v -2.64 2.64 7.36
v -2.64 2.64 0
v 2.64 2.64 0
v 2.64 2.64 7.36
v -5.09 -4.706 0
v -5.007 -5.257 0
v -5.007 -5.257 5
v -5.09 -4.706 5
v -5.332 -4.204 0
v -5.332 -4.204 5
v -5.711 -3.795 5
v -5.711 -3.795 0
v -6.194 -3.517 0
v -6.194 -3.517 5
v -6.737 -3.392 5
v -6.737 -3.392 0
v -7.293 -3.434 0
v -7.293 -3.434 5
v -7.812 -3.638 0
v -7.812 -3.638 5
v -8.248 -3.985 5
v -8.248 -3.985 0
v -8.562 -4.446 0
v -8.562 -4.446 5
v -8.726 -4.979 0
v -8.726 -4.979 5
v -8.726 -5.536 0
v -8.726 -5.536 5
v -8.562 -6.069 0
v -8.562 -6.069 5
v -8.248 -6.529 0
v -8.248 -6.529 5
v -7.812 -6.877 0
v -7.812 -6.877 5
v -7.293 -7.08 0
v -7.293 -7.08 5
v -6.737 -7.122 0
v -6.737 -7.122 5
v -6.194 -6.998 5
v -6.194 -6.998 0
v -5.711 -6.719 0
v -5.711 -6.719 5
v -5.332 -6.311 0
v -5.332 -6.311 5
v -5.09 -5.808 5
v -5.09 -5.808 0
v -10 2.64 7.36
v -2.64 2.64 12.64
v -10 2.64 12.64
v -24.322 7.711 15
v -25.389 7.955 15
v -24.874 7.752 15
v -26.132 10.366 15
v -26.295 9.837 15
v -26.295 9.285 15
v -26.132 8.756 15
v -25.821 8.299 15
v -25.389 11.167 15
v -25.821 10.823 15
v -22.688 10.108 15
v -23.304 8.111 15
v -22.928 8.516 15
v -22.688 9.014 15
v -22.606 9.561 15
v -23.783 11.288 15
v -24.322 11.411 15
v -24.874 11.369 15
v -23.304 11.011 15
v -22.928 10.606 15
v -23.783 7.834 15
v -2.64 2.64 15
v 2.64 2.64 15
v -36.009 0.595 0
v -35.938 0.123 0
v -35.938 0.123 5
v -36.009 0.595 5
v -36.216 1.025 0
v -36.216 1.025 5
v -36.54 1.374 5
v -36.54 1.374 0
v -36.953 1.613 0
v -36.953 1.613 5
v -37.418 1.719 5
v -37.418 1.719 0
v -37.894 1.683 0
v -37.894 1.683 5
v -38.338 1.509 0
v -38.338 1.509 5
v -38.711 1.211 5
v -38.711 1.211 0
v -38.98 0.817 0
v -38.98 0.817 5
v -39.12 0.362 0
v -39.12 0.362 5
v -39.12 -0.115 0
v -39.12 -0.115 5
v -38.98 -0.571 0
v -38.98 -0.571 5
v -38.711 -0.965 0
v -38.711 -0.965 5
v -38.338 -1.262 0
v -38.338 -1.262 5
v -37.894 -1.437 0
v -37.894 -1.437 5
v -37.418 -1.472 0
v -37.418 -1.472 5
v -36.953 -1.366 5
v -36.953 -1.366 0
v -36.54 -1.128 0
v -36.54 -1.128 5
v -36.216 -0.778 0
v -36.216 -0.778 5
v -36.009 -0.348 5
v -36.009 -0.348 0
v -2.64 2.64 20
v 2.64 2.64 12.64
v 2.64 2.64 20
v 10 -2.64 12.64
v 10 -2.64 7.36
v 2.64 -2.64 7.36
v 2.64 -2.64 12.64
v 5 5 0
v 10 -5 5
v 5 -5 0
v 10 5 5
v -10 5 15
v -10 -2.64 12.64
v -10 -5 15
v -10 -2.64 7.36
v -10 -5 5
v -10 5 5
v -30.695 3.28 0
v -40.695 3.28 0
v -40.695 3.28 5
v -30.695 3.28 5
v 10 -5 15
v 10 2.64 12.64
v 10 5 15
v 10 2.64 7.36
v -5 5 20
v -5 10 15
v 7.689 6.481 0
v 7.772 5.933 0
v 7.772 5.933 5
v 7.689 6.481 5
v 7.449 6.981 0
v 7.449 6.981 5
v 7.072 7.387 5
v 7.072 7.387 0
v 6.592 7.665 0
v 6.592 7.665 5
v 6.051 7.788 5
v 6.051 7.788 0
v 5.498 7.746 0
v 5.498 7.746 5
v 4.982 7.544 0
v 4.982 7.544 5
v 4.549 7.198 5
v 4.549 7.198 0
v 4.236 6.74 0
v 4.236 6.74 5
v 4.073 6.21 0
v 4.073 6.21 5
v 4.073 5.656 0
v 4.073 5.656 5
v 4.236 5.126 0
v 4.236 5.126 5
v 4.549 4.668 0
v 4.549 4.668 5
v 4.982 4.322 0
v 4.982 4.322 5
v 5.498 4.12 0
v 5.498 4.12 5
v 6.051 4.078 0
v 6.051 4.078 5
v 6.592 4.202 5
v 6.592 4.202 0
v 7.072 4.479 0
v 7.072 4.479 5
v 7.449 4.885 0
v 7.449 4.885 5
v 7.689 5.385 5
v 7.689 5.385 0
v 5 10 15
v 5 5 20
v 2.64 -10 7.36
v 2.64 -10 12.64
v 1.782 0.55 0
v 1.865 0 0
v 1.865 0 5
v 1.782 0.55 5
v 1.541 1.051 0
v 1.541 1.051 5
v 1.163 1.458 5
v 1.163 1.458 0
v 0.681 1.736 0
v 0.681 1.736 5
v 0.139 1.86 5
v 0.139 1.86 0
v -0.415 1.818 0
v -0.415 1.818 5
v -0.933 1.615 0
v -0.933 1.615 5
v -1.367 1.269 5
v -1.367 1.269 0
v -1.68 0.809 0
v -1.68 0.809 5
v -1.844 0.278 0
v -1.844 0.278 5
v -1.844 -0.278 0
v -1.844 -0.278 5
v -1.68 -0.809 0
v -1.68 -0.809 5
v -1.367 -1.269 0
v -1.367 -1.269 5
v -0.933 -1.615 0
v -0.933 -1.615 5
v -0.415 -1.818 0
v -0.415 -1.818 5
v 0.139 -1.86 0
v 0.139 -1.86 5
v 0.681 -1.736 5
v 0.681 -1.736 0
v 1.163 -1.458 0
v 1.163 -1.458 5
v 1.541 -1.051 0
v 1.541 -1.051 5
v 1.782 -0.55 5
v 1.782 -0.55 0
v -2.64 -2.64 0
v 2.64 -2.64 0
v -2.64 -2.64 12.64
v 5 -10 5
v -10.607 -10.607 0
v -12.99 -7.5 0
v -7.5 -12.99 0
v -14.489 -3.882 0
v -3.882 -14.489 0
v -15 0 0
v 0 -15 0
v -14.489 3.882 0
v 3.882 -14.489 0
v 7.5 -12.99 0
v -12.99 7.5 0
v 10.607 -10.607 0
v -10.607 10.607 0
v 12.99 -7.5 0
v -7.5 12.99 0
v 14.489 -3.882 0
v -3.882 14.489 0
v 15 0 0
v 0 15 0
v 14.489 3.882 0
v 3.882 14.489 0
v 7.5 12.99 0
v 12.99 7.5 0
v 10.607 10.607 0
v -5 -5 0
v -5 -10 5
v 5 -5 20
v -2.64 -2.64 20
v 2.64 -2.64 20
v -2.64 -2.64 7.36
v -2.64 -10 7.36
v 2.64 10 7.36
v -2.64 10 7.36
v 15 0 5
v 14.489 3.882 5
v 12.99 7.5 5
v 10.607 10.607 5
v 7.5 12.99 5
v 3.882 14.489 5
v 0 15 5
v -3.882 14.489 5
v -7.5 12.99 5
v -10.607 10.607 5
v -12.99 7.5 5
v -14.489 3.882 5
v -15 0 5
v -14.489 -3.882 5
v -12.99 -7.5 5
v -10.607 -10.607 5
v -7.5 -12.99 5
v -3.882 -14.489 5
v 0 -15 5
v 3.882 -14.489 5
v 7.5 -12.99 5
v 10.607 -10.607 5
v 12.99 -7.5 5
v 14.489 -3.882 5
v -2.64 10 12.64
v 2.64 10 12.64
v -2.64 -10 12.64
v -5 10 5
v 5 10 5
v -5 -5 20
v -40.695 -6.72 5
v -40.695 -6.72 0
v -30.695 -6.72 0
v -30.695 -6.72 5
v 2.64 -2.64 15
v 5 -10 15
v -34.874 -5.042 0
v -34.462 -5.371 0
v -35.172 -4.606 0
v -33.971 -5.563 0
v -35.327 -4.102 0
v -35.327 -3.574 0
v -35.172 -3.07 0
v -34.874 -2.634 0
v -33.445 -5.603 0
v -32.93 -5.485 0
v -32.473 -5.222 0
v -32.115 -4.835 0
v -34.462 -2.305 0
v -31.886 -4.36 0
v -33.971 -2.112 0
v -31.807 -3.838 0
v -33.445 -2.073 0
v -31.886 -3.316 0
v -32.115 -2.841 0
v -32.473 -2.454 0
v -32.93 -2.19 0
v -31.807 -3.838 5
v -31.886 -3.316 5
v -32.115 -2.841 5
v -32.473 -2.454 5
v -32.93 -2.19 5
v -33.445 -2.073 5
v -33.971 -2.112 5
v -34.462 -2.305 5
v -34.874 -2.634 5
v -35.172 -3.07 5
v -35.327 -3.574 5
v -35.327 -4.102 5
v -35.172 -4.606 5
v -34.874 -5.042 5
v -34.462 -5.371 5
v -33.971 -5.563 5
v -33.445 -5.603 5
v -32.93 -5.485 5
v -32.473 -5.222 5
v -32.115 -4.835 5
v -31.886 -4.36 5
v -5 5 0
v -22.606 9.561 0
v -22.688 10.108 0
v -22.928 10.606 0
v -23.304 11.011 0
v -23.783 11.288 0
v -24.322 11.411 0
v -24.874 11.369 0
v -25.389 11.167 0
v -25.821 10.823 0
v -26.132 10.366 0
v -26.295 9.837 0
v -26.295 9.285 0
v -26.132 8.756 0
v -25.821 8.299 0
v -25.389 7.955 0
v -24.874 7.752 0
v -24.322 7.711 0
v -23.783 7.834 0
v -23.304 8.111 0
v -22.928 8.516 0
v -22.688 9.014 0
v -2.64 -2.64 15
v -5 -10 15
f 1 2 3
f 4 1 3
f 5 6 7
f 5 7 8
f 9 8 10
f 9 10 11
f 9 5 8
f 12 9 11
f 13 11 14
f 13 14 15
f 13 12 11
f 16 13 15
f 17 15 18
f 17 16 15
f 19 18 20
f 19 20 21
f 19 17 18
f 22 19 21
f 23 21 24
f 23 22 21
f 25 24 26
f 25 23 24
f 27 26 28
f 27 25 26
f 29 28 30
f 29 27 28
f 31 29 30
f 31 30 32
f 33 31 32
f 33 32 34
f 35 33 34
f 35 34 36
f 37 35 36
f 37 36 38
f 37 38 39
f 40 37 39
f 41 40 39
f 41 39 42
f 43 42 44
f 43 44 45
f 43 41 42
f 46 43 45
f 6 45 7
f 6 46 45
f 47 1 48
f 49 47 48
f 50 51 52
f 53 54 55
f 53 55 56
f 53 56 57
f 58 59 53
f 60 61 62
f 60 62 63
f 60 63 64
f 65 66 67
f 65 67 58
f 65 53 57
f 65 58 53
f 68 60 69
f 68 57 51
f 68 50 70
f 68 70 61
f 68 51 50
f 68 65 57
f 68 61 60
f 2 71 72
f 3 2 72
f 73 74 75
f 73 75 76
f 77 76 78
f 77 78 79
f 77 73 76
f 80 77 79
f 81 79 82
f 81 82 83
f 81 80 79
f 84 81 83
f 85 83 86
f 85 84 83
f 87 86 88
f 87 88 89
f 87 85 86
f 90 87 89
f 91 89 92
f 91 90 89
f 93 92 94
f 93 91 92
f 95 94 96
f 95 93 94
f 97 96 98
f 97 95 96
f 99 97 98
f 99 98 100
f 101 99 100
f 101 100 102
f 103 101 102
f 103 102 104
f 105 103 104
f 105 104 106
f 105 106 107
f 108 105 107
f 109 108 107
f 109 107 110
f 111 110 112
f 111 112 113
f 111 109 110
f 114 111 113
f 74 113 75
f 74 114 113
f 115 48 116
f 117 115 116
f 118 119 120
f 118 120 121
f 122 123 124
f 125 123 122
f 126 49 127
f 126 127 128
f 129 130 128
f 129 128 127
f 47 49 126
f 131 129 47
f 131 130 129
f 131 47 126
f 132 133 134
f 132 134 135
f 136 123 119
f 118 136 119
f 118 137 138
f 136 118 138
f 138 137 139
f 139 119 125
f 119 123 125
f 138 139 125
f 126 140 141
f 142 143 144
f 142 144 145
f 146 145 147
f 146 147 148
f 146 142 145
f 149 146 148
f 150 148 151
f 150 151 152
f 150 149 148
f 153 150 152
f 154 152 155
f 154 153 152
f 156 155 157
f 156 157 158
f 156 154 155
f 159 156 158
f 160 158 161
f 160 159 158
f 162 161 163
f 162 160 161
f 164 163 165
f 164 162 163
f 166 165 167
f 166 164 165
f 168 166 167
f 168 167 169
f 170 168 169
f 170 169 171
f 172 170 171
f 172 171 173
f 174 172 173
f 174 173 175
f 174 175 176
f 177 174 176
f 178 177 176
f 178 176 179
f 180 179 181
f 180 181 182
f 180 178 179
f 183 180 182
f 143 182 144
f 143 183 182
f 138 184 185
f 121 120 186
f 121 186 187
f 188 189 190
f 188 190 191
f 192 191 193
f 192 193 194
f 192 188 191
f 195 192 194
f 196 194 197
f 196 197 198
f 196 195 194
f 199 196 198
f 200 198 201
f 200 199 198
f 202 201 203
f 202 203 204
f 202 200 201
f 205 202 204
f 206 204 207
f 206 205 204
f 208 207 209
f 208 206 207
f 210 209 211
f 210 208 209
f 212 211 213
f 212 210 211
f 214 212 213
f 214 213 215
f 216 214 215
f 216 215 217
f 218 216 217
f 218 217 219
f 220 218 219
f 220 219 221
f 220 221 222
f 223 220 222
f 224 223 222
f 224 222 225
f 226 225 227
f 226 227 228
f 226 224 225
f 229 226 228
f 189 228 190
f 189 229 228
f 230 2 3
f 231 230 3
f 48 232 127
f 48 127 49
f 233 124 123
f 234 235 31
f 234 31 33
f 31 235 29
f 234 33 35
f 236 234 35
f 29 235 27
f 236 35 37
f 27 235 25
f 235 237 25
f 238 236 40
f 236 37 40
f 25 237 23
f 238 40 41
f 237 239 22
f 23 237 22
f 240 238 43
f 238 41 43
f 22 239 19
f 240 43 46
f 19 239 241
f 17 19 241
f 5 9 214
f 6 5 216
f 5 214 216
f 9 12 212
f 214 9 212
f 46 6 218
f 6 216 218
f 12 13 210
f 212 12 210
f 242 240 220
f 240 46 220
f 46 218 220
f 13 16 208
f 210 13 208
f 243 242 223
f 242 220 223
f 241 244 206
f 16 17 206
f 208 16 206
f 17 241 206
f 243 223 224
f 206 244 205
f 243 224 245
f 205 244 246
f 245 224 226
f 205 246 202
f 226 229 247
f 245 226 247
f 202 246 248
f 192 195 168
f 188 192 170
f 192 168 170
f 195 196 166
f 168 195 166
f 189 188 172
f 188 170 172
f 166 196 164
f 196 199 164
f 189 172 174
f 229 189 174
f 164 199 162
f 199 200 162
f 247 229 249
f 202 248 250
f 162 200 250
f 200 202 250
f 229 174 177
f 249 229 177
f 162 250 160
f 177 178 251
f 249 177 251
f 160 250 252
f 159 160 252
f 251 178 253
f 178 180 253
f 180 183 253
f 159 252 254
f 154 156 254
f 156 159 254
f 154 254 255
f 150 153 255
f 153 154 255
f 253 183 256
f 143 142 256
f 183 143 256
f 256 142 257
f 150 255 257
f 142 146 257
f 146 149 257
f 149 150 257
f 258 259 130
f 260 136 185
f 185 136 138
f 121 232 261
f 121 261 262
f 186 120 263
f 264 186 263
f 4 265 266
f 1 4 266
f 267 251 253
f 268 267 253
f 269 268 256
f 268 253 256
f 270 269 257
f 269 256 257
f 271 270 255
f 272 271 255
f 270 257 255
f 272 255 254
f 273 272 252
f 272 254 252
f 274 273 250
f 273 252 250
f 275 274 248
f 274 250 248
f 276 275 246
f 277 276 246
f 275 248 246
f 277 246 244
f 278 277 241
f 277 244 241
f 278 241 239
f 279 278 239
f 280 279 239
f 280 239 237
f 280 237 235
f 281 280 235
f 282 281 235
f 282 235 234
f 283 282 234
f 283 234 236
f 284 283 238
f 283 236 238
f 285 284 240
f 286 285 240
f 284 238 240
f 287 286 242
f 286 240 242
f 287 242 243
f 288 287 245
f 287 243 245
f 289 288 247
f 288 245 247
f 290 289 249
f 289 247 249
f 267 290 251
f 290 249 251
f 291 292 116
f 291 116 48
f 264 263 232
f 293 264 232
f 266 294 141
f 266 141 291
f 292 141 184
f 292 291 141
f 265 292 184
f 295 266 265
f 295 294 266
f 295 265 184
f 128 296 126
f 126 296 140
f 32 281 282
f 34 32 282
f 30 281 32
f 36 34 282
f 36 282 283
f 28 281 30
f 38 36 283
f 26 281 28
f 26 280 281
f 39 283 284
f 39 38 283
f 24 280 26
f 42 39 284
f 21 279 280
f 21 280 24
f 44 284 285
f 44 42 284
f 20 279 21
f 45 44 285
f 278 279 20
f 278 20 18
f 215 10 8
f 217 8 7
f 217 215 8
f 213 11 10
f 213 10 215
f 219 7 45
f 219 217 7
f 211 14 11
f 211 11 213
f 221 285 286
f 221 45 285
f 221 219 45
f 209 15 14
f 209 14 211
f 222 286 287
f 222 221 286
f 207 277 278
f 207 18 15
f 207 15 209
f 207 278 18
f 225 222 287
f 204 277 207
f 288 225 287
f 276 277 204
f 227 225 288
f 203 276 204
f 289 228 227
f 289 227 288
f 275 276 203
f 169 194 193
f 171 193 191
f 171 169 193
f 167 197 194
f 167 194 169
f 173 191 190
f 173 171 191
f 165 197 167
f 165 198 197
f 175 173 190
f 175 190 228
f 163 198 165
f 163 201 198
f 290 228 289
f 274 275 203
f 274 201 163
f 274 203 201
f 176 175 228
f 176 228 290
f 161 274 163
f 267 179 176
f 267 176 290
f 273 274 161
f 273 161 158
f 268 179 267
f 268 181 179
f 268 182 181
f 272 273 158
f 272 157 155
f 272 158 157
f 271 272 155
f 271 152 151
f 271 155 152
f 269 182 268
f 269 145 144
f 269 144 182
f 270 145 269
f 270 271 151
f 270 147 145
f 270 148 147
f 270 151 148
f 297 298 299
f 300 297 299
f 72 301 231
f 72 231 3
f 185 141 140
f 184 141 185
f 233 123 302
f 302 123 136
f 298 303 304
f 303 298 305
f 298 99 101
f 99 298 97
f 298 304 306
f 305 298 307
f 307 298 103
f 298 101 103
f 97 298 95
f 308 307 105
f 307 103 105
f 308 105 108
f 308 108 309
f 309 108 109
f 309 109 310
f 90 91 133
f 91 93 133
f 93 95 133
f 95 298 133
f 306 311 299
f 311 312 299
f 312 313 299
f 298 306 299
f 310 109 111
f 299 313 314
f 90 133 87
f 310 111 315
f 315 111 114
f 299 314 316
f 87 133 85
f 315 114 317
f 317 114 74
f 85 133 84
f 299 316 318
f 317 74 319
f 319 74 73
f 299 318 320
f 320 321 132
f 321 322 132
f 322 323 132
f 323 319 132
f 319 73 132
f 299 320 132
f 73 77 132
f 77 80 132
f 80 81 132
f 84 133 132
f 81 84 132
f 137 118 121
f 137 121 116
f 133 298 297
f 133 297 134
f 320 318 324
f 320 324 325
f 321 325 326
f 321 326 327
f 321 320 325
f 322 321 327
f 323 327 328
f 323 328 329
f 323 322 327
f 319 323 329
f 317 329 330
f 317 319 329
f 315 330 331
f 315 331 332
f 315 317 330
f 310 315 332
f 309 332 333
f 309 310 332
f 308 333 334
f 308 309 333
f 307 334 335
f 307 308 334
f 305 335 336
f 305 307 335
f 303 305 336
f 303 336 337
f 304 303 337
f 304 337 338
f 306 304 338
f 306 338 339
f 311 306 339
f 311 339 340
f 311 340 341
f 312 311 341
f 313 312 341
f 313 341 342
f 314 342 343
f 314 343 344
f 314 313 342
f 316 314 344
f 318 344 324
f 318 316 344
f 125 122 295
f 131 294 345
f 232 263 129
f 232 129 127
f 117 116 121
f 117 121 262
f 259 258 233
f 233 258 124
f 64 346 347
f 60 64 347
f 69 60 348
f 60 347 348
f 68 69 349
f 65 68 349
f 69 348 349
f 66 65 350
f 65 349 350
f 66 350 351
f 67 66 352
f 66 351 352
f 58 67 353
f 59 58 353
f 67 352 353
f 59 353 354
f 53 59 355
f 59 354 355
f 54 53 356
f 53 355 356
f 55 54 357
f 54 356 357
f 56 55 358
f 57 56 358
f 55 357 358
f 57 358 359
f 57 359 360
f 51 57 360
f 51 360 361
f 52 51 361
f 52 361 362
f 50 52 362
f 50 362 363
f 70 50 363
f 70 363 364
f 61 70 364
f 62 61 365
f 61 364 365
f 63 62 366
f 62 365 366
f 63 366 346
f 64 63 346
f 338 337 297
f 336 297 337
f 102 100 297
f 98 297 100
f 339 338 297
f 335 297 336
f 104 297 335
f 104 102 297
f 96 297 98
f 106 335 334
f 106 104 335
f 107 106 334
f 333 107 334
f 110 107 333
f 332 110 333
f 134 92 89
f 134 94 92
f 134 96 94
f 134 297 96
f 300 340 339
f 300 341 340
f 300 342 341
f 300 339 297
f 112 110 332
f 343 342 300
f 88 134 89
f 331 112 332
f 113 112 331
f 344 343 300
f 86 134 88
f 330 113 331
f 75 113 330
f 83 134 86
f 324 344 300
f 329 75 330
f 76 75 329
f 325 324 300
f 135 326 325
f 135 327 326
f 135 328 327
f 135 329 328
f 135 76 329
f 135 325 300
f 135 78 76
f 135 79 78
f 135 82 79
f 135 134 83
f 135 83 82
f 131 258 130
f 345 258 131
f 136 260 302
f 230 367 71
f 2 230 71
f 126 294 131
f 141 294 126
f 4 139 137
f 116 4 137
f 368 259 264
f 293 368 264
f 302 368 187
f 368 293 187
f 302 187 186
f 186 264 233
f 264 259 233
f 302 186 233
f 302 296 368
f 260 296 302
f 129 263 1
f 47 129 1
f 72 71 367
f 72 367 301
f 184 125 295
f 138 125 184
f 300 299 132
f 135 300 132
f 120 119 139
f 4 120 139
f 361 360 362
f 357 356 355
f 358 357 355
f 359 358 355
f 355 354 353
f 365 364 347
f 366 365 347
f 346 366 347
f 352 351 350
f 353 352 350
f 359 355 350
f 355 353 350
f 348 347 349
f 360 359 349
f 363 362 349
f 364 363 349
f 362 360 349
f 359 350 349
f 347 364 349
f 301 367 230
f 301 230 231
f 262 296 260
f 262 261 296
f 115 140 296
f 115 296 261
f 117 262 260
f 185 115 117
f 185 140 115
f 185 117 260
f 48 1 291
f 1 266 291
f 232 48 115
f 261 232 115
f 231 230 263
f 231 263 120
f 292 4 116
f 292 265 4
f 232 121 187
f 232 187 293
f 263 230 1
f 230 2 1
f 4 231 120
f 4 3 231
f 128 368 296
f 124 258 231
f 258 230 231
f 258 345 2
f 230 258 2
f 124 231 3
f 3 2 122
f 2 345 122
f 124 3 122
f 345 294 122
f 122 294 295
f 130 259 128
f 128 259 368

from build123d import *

# Parameters (mm, degrees)
F0_R      = 15
F0_R_2    = 1.87
F0_R_3    = 1.865
F0_R_4    = 1.86
F1_DEPTH  = 5
F2_R      = 1.855
F3_DEPTH  = 15
F4_W      = 10
F4_H      = 10
F4_R      = 1.77
F4_R_2    = 1.6
F5_DEPTH  = 5
F6_W      = 20
F6_H      = 20
F6_W_2    = 5.28
F6_H_2    = 5.28
F7_DEPTH  = 20
F8_W      = 5.28
F8_H      = 5.28
F9_DEPTH  = 25
F10_W     = 5.28
F10_H     = 5.28
F11_DEPTH = 25
F12_SIZE  = 5
F13_DEPTH = 15


with BuildPart() as f1:
    # F0 (on Top) → F1 (new body)
    with BuildSketch(Plane.XY):
        Circle(F0_R)
        with Locations((-6.87702, -5.257264)):
            Circle(F0_R_2, mode=Mode.SUBTRACT)
        Circle(F0_R_3, mode=Mode.SUBTRACT)
        with Locations((5.911977, 5.933111)):
            Circle(F0_R_4, mode=Mode.SUBTRACT)
    extrude(amount=F1_DEPTH)


with BuildPart() as f3:
    # F2 (on Top) → F3 (new body)
    with BuildSketch(Plane.XY):
        with Locations((-24.461024, 9.560991)):
            Circle(F2_R)
    extrude(amount=F3_DEPTH)


with BuildPart() as f5:
    # F4 (on Top) → F5 (new body)
    with BuildSketch(Plane.XY):
        with Locations((-35.694532, -1.720287)):
            Rectangle(F4_W, F4_H)
        with Locations((-33.576981, -3.837838)):
            Circle(F4_R, mode=Mode.SUBTRACT)
        with Locations((-37.538031, 0.123212)):
            Circle(F4_R_2, mode=Mode.SUBTRACT)
    extrude(amount=F5_DEPTH)


with BuildPart() as f7:
    # F6 (on Top) → F7 (new body)
    with BuildSketch(Plane.XY):
        Rectangle(F6_W, F6_H)
        Rectangle(F6_W_2, F6_H_2, mode=Mode.SUBTRACT)
    extrude(amount=F7_DEPTH)

    # F8 (on face) → F9 (cut)
    with BuildSketch(Plane(origin=(0, 10, 0), x_dir=(-1, 0, 0), z_dir=(0, 1, 0))):
        with Locations((0, 10)):
            Rectangle(F8_W, F8_H)
    extrude(amount=-F9_DEPTH, mode=Mode.SUBTRACT)

    # F10 (on face) → F11 (cut)
    with BuildSketch(Plane.YZ.offset(10)):
        with Locations((0, 10)):
            Rectangle(F10_W, F10_H)
    extrude(amount=-F11_DEPTH, mode=Mode.SUBTRACT)

    # F12
    f12_edges = [f7.edges().sort_by_distance(p)[0] for p in [
        (0, 10, 0),
        (0, 10, 20),
        (0, -10, 20),
        (0, -10, 0),
        (10, 0, 0),
        (10, 10, 10),
        (10, 0, 20),
        (10, -10, 10),
        (-10, -10, 10),
        (-10, 0, 20),
        (-10, 10, 10),
        (-10, 0, 0),
    ]]
    chamfer(f12_edges, length=F12_SIZE)


with BuildPart() as f13:
    # F6 (on Top) → F13 (new body)
    with BuildSketch(Plane.XY):
        Rectangle(F6_W_2, F6_H_2)
    extrude(amount=F13_DEPTH)


solid = Compound([f1.part, f3.part, f5.part, f7.part, f13.part])
